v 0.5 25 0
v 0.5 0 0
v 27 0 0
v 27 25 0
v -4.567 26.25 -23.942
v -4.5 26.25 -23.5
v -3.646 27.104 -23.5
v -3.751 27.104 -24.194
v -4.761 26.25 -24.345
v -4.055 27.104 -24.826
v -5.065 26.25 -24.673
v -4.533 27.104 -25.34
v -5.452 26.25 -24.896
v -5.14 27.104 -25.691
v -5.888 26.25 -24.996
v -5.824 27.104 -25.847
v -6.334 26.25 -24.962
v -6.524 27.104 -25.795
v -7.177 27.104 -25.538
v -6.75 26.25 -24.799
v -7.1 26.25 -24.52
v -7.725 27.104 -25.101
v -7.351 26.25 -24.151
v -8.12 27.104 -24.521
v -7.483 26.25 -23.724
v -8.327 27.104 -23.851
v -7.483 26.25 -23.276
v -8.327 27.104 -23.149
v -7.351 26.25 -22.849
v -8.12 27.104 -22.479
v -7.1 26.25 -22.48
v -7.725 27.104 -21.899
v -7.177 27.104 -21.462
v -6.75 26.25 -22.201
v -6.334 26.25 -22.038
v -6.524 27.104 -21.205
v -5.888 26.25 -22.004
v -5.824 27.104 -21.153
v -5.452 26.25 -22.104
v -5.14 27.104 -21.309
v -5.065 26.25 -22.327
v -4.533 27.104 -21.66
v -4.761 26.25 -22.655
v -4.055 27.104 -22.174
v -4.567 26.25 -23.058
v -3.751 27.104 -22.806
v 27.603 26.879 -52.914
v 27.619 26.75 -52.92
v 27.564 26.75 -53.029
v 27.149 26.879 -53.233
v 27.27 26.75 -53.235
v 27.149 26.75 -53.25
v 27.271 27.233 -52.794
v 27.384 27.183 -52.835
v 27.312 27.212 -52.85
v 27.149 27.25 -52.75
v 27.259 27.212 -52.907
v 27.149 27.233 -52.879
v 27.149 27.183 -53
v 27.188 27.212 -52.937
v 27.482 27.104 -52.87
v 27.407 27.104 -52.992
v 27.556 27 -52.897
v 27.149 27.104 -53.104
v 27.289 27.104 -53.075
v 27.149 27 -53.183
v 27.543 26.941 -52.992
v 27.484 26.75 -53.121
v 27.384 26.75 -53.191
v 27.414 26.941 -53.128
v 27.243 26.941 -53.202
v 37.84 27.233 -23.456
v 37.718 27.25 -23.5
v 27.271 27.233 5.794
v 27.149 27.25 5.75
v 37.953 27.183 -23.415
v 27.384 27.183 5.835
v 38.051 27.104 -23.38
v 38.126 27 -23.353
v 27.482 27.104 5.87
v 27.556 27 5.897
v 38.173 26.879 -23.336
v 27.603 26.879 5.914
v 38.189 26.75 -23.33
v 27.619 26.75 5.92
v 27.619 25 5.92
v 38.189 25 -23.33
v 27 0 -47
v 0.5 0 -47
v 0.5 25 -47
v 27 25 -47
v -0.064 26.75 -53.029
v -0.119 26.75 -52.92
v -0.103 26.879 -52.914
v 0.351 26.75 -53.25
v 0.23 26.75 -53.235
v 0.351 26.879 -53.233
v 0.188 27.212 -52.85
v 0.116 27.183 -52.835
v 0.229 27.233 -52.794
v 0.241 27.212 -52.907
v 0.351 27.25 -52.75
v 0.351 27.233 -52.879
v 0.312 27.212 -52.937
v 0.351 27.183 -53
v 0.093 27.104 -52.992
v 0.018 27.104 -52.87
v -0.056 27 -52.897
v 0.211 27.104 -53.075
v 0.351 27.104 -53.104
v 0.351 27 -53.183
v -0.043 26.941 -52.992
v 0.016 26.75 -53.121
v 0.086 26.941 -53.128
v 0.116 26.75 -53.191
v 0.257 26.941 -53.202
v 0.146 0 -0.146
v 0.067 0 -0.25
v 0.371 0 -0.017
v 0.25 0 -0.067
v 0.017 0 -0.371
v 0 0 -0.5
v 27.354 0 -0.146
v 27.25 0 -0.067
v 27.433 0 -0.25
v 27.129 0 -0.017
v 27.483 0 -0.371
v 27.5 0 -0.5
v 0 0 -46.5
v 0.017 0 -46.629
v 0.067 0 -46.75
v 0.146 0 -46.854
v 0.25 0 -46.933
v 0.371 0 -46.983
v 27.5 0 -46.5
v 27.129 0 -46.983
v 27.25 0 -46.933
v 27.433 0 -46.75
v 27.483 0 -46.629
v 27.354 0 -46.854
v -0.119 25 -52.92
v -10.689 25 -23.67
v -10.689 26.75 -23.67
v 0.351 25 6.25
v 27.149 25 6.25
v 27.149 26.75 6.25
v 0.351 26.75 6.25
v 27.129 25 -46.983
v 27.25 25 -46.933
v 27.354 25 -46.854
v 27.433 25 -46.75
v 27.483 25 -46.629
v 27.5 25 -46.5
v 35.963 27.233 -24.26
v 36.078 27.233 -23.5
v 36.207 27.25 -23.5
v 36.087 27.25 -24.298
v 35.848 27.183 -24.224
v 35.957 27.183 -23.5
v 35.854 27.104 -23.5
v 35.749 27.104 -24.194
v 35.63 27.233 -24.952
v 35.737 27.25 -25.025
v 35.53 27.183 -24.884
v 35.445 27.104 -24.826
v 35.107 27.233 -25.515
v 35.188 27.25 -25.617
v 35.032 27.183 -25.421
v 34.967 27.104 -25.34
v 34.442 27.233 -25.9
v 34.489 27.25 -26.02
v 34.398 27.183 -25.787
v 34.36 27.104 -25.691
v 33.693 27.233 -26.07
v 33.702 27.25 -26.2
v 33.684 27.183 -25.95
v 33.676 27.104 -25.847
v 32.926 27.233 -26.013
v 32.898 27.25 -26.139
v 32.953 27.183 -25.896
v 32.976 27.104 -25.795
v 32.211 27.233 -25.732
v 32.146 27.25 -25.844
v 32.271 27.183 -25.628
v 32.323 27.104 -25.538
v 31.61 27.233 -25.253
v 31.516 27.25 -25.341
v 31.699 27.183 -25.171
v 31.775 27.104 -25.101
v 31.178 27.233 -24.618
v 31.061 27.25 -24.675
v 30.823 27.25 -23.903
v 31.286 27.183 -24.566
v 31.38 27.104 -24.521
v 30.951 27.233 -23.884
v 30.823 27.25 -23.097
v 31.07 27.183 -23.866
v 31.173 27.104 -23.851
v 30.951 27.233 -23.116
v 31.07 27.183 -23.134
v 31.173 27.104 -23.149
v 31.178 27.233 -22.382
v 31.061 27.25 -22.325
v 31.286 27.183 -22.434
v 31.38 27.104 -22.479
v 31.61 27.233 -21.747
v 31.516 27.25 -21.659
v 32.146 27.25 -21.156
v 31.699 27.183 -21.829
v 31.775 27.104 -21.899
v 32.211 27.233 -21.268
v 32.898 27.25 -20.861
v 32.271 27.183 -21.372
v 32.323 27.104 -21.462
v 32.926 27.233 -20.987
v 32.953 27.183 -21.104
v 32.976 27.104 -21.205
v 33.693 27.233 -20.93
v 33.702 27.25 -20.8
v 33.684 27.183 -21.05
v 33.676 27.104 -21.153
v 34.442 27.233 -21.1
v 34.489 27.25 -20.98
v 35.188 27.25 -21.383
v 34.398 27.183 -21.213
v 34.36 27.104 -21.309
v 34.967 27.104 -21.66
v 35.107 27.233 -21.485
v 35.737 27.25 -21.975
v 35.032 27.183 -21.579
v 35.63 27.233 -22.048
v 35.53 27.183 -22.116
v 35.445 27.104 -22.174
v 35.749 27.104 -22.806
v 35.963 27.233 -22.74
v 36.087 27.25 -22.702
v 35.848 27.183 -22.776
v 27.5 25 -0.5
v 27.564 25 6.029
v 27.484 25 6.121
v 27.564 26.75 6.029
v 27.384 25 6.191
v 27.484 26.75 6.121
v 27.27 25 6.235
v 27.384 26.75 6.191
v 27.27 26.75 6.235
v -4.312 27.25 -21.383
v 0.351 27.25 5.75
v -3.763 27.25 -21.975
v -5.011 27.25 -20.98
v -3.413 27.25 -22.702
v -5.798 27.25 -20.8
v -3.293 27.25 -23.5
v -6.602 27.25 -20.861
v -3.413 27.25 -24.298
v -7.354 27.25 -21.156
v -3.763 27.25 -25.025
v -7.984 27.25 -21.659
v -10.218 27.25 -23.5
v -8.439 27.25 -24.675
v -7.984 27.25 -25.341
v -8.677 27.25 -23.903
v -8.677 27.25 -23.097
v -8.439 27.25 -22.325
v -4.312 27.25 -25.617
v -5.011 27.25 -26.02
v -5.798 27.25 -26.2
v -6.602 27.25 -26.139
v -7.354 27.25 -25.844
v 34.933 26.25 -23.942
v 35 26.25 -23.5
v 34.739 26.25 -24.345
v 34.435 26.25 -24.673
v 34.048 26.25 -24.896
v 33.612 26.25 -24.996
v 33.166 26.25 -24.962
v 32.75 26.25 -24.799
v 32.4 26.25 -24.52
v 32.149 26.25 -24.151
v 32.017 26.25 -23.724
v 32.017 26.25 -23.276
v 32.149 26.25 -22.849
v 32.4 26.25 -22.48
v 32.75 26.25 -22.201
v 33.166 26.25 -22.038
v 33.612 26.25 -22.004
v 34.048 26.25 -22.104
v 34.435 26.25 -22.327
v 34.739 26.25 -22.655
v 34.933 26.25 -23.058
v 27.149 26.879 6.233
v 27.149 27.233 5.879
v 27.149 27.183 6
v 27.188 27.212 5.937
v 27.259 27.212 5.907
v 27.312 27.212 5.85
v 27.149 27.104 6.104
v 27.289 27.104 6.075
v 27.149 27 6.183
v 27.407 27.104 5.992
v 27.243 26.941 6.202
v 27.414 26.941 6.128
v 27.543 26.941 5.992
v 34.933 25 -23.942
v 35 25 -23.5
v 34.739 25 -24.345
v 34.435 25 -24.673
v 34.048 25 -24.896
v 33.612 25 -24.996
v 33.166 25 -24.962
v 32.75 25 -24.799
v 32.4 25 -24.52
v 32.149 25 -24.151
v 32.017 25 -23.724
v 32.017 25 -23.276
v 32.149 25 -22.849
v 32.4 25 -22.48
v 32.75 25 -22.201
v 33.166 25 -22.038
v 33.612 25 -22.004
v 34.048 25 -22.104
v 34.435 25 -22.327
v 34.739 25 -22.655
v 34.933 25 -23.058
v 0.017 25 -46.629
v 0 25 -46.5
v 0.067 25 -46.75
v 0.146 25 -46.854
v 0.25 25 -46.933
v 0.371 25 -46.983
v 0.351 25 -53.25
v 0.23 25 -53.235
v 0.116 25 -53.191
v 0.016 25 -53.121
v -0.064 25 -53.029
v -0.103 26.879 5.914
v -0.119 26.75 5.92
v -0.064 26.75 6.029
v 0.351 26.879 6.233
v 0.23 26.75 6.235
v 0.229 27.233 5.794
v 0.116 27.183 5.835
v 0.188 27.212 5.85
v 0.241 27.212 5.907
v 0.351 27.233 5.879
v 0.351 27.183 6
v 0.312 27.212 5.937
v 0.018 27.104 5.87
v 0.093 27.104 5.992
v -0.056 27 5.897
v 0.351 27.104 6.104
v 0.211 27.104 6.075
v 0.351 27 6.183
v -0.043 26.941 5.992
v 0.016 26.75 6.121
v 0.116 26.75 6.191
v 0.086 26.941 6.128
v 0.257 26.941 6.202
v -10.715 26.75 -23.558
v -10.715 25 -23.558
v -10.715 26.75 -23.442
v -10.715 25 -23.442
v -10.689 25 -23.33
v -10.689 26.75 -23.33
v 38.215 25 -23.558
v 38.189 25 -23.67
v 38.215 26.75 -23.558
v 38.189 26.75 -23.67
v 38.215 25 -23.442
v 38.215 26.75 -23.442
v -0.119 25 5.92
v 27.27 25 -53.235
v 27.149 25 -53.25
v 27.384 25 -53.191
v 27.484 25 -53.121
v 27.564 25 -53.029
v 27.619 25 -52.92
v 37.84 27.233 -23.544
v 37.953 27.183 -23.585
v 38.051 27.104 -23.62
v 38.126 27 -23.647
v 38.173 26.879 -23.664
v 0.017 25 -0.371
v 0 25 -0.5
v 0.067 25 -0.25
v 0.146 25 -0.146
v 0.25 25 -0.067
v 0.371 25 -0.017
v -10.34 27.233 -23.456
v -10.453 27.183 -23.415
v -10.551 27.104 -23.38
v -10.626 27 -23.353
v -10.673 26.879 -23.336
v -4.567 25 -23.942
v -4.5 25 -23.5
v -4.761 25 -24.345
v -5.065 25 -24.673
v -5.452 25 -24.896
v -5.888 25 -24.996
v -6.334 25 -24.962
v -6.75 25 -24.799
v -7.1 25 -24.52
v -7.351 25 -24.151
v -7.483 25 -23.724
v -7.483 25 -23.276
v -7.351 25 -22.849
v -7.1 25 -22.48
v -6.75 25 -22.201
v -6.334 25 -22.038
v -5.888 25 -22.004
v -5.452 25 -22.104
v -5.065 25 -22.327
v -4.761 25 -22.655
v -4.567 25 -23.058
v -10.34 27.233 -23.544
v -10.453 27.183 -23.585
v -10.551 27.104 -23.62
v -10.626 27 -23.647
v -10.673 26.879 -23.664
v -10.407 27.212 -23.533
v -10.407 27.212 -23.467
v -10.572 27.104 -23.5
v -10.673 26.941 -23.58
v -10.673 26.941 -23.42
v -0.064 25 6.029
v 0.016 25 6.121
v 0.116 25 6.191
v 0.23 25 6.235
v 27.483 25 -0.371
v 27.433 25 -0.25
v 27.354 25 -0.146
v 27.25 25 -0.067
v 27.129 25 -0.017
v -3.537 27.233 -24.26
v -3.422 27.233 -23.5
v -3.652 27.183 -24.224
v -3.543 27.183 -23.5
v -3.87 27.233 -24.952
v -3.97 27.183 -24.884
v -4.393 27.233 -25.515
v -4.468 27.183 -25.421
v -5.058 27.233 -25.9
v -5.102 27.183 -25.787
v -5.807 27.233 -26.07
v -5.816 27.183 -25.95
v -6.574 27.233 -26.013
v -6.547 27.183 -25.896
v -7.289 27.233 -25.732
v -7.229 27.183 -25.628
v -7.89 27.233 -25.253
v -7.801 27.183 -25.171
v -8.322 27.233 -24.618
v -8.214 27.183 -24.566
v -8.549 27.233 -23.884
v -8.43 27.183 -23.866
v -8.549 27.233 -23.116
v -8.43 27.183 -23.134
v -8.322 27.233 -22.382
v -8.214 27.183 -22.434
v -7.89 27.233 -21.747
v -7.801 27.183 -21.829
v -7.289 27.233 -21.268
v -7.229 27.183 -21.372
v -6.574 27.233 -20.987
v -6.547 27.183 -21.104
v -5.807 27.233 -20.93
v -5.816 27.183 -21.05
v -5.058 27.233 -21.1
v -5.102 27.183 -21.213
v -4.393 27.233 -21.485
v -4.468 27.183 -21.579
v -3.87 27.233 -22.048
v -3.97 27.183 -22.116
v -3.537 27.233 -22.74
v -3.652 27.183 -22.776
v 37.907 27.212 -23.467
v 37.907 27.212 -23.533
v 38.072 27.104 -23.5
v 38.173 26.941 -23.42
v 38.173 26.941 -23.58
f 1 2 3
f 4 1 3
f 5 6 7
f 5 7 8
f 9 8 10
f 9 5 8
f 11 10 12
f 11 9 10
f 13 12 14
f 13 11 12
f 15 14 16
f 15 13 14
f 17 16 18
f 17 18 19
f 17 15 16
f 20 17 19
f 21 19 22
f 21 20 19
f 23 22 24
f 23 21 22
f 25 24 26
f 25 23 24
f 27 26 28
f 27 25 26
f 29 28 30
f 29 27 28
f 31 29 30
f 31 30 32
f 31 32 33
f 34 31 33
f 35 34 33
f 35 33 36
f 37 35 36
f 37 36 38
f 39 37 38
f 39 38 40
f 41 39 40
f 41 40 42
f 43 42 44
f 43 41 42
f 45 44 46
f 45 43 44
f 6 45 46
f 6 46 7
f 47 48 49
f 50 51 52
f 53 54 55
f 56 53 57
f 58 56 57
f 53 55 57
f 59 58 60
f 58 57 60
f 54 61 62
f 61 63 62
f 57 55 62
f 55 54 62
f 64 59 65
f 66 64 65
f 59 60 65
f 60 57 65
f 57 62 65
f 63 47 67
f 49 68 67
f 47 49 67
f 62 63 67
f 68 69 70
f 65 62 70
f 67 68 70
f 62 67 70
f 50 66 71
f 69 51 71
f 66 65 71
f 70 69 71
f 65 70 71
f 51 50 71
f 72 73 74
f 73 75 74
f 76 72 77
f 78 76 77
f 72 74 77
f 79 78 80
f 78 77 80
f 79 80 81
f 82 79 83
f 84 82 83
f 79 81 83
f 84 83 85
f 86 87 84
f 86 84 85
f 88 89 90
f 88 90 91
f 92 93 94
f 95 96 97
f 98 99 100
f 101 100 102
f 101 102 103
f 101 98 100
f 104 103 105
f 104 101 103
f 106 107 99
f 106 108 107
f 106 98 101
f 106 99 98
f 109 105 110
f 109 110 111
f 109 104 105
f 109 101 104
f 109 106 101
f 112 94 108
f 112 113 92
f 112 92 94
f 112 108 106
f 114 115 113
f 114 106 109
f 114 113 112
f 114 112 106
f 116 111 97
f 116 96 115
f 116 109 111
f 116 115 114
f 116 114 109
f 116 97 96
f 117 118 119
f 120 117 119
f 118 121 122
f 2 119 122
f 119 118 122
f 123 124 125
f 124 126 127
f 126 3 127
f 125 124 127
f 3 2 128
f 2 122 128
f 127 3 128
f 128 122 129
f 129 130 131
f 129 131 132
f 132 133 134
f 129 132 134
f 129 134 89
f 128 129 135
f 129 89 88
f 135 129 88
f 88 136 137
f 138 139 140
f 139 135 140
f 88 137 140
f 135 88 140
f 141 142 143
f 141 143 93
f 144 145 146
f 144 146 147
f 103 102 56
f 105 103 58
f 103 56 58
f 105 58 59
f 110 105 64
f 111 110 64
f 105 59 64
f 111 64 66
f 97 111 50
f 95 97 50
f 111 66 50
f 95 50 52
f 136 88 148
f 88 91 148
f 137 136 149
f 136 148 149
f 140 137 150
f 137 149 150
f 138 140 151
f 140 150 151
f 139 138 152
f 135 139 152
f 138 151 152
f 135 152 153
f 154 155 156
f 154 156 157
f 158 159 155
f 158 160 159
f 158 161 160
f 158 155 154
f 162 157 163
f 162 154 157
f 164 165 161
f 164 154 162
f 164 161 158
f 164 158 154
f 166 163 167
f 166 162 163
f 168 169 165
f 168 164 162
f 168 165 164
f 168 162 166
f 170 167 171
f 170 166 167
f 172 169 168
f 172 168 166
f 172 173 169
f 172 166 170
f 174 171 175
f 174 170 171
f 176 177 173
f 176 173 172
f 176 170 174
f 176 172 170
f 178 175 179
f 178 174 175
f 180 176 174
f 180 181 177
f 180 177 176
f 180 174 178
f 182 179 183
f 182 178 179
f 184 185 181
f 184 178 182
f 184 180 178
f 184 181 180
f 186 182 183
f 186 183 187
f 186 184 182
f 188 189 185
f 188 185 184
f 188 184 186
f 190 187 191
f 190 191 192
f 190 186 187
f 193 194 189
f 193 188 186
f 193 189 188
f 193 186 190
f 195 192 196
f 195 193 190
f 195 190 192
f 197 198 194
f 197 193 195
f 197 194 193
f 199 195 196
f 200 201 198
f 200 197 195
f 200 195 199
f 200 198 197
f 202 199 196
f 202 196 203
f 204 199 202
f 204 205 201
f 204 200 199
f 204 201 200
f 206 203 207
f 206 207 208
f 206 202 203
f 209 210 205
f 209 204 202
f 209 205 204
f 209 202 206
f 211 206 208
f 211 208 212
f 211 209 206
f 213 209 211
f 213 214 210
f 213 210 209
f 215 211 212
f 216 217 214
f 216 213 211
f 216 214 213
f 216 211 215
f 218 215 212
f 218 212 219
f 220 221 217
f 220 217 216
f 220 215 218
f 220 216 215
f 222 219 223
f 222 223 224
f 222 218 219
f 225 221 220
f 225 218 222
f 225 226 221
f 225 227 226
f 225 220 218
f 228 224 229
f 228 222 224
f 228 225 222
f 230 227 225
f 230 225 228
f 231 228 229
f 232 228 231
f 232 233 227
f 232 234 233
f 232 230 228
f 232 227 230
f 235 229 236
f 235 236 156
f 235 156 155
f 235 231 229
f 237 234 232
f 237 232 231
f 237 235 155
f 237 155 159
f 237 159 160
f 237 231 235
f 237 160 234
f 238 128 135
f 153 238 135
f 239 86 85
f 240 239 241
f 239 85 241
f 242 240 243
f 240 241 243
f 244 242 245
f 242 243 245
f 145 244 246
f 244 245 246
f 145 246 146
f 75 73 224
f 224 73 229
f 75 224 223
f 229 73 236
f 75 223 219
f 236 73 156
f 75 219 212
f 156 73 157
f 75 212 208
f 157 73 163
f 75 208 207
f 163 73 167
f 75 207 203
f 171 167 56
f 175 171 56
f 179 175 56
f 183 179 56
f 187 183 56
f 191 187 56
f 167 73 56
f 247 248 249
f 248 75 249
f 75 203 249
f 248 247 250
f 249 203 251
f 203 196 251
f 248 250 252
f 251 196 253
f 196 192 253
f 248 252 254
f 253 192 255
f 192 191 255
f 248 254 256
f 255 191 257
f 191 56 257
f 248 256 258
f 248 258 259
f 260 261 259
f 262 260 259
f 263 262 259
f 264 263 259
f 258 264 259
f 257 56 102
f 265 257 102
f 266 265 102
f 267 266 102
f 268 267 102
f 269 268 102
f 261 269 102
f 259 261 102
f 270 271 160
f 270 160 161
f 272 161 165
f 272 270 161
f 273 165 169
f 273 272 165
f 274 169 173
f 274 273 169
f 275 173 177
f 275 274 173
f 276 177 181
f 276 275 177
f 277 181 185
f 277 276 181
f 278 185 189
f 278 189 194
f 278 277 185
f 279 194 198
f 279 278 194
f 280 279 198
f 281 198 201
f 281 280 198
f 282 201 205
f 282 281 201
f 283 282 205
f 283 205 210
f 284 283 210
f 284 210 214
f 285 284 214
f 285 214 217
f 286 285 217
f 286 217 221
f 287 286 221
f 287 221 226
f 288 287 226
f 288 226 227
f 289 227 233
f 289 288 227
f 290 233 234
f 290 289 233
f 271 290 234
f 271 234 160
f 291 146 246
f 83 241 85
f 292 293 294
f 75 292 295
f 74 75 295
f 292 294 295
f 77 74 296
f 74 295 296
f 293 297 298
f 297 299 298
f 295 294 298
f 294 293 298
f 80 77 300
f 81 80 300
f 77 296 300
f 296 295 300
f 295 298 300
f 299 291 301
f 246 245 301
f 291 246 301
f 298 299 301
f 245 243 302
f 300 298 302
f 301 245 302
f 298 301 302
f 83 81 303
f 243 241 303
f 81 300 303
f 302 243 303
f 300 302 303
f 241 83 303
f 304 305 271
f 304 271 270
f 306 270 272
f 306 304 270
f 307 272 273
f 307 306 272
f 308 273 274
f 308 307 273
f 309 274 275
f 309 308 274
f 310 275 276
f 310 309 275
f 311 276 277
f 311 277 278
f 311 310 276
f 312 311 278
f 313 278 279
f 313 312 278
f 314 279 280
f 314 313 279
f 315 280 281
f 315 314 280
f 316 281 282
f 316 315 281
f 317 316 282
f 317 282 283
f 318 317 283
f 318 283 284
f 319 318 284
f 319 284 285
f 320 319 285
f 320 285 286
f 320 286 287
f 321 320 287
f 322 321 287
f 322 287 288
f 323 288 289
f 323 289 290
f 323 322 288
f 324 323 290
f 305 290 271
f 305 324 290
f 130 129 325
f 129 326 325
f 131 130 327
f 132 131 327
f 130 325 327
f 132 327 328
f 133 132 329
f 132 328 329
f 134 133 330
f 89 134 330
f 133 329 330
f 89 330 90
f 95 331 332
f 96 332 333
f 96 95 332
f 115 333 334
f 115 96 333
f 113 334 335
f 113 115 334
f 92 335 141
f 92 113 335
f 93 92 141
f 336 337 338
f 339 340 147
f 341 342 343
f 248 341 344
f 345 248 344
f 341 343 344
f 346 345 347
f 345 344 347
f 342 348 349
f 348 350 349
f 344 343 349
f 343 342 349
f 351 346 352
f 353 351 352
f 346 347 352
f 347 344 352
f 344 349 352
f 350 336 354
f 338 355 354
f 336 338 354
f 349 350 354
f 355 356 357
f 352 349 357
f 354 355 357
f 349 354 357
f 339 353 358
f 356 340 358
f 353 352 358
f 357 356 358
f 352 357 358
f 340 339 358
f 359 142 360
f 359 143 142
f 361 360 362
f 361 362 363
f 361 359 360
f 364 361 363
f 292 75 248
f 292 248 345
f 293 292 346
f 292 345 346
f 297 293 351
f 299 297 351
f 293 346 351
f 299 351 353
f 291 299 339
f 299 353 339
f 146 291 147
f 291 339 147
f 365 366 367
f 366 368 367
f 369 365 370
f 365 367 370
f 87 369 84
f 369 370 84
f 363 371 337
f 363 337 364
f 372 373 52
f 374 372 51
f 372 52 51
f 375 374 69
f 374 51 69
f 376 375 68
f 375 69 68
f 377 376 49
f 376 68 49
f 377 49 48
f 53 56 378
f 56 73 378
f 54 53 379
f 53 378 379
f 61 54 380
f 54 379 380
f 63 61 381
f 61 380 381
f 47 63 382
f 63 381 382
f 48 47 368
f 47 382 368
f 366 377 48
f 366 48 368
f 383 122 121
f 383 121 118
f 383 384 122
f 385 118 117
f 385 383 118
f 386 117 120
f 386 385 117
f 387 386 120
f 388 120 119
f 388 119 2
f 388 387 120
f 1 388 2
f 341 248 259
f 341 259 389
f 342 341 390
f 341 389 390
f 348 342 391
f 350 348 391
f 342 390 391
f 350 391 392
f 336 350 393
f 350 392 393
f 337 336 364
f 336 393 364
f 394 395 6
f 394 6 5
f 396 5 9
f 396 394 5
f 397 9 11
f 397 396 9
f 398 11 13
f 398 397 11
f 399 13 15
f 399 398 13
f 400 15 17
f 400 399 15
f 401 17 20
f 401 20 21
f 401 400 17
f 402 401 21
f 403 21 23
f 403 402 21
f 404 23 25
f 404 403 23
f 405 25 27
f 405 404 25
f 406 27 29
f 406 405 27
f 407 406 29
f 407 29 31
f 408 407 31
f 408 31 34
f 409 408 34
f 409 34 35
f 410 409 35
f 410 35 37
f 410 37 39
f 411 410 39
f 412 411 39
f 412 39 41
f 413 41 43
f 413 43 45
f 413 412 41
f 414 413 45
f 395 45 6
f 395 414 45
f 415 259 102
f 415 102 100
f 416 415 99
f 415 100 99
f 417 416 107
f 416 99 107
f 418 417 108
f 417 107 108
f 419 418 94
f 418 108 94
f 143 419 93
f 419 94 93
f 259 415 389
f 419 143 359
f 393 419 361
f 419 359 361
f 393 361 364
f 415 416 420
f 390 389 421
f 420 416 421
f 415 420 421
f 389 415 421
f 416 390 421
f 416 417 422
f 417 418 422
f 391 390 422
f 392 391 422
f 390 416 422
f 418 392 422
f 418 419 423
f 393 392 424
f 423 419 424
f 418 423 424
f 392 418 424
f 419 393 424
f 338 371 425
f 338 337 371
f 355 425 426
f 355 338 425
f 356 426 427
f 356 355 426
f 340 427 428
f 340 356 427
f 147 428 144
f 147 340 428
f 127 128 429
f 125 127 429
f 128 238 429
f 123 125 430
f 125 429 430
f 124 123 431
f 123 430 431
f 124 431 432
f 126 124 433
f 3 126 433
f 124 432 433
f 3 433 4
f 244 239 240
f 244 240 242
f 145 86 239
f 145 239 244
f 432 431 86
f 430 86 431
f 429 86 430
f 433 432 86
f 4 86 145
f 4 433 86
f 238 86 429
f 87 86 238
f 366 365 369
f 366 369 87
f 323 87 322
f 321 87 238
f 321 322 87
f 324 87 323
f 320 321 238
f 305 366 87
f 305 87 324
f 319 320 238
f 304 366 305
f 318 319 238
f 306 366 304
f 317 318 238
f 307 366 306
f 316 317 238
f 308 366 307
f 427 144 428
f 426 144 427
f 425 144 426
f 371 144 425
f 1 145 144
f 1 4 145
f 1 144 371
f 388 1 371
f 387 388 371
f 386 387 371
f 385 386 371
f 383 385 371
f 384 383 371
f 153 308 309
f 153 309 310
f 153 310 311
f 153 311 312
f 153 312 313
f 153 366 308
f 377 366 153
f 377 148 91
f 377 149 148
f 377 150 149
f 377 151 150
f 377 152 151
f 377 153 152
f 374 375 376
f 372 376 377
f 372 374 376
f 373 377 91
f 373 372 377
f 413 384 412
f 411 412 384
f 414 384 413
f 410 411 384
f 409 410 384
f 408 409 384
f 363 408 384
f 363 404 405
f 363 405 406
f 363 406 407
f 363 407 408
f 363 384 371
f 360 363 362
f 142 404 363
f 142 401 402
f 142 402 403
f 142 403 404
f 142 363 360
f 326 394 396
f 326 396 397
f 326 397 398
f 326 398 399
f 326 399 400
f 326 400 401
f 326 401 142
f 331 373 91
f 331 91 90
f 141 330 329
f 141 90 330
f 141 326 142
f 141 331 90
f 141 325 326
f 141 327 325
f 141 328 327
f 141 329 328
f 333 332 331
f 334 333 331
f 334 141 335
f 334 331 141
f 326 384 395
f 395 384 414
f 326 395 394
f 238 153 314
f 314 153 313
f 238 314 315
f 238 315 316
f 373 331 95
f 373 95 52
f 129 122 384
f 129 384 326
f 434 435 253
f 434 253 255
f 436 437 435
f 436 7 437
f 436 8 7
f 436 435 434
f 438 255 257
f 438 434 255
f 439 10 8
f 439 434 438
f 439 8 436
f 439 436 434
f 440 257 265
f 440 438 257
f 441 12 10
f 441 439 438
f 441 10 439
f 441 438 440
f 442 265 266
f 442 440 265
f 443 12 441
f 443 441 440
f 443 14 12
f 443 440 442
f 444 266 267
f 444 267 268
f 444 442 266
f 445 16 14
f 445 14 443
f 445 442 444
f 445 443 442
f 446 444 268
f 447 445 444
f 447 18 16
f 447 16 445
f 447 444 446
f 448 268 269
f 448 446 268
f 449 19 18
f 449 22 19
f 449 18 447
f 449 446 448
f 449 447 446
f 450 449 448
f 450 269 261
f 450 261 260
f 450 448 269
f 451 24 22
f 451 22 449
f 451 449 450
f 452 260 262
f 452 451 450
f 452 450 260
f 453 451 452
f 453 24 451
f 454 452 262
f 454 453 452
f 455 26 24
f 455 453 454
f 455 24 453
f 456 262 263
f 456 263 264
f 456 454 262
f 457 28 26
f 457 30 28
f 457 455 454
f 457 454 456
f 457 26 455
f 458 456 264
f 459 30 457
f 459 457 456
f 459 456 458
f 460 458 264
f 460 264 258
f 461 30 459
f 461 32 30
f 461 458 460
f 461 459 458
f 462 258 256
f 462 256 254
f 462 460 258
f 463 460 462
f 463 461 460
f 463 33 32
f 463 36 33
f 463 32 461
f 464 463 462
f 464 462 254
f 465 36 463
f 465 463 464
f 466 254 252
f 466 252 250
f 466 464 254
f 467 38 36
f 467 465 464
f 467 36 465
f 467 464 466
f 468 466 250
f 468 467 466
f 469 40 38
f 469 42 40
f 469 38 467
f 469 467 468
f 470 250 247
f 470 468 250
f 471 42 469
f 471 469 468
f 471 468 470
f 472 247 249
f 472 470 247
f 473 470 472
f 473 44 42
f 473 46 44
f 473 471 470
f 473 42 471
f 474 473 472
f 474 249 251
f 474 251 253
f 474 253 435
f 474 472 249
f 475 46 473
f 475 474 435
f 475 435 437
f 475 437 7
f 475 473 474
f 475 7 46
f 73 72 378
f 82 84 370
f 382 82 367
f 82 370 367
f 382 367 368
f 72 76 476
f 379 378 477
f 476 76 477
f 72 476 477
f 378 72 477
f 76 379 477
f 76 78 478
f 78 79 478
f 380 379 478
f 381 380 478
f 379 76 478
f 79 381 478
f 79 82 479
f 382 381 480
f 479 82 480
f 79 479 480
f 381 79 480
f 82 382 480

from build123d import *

# Parameters (mm, degrees)
SKETCH1_W           = 27.5
SKETCH1_H           = 47
BOSS_EXTRUDE1_DEPTH = 25
SKETCH2_R           = 1.5
BOSS_EXTRUDE2_DEPTH = 2.25
CHAMFER1_SIZE       = 1
FILLET1_R           = 0.5


with BuildPart() as part:
    # Sketch1 → Boss-Extrude1 (new body)
    with BuildSketch(Plane(origin=(0, 0, 0), x_dir=(1, 0, 0), z_dir=(0, 1, 0))):
        with Locations((13.75, 23.5)):
            Rectangle(SKETCH1_W, SKETCH1_H)
    extrude(amount=BOSS_EXTRUDE1_DEPTH)

    # Sketch2 → Boss-Extrude2 (add)
    with BuildSketch(Plane(origin=(0, 25, 0), x_dir=(1, 0, 0), z_dir=(0, 1, 0))):
        Polygon((0, 53.25), (27.5, 53.25), (38.25, 23.5), (27.5, -6.25), (0, -6.25), (-10.75, 23.5), align=None)
        with Locations((-6, 23.5)):
            Circle(SKETCH2_R, mode=Mode.SUBTRACT)
        with Locations((33.5, 23.5)):
            Circle(SKETCH2_R, mode=Mode.SUBTRACT)
    extrude(amount=BOSS_EXTRUDE2_DEPTH)

    # Chamfer1
    chamfer1_edges = [part.edges().sort_by_distance(p)[0] for p in [
        (-7.5, 27.25, -23.5),
        (32, 27.25, -23.5),
    ]]
    chamfer(chamfer1_edges, length=CHAMFER1_SIZE)

    # Fillet1
    fillet1_edges = [part.edges().sort_by_distance(p)[0] for p in [
        (-5.375, 27.25, -38.375),
        (-5.375, 27.25, -8.625),
        (13.75, 27.25, 6.25),
        (32.875, 27.25, -8.625),
        (32.875, 27.25, -38.375),
        (13.75, 27.25, -53.25),
        (0, 26.125, -53.25),
        (-10.75, 26.125, -23.5),
        (0, 26.125, 6.25),
        (27.5, 26.125, 6.25),
        (38.25, 26.125, -23.5),
        (27.5, 26.125, -53.25),
        (31, 27.25, -23.5),
        (-8.5, 27.25, -23.5),
        (0, 12.5, -47),
        (27.5, 12.5, -47),
        (27.5, 12.5, 0),
        (0, 12.5, 0),
    ]]
    fillet(fillet1_edges, radius=FILLET1_R)


solid = part.part
